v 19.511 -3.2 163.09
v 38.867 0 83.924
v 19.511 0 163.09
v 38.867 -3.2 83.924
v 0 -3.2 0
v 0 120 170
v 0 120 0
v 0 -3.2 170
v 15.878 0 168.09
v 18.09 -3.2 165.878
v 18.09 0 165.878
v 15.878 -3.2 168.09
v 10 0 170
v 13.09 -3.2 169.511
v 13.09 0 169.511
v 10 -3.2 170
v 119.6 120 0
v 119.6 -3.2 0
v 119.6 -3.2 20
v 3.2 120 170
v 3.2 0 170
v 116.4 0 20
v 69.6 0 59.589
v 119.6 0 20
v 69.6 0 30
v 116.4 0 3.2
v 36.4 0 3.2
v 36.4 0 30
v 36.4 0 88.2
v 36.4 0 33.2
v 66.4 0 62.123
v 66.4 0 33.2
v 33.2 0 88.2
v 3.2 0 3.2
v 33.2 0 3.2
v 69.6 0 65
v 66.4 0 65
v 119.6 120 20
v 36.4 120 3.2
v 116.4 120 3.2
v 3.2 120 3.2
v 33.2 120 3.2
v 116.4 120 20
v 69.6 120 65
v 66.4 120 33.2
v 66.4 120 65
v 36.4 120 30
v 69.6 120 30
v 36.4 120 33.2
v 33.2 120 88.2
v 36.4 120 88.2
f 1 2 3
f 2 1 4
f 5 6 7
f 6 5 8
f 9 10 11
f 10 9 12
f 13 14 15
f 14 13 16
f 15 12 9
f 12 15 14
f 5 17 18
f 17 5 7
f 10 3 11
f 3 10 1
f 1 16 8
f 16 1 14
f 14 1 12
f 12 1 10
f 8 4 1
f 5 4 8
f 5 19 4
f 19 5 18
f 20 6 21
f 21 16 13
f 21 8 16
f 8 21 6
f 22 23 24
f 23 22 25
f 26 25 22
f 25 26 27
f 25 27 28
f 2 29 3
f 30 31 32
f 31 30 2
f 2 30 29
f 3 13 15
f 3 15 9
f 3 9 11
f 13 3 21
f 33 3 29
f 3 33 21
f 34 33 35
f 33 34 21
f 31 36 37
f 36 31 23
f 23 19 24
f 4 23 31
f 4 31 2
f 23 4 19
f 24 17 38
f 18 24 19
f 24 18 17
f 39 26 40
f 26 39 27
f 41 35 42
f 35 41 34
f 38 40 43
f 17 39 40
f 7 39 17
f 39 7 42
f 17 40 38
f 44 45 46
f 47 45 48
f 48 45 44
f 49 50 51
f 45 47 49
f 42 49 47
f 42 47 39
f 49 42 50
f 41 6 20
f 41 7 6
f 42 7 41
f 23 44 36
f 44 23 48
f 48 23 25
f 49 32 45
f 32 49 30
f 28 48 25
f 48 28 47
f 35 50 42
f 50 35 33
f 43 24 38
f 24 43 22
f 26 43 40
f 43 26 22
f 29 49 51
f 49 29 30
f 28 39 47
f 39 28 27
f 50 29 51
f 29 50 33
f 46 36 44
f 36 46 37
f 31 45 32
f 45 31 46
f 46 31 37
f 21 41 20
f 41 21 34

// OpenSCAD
// support carte

carte=[.5,88,55];
flyer=[.5,120,210];

ep=3.2;
y=flyer.y;

x1=30;
x2=30;
x3=80;
x4=x1+x3+3*ep;

z1=20;
z2=30;
z3=carte.z-20;

z4=z2+ep+z3+20;

z5=flyer.z-40;

alpha=20;


fond1();
translate([x1+ep,0,z2]) fond2();
translate([x4-ep,0,0]) facade();
translate([x1+ep,0,0]) cloison1();
translate([x1+x2+2*ep,0,z2]) cloison2();
dos();


cote();

module cote()
{
r=10;
 rotate([90,0,0])  union()
    {
        hull()
        {
            cube([.1,z5,ep]);
            translate([10,z5-r,0]) cylinder(ep,r,r,$fn=20);
            translate([x1,z4-r]) cylinder(ep,r,r,$fn=20);
        }
        hull()
        {
            
            translate([x1,z4-r]) cylinder(ep,r,r,$fn=20);
            cube([x4,z1,ep]);
        }
    }
}

module fond1()
{
cube([x4,y,ep]);
}

module fond2()
{
cube([x2+2*ep,y,ep]);
}


module dos()
{
    cube([ep,y,z5]);
}

module facade()
{
cube([ep,y,z1]);
}

module cloison1()
{
    cube([ep,y,z4]);
}

module cloison2()
{
    cube([ep,y,z3]);
}
